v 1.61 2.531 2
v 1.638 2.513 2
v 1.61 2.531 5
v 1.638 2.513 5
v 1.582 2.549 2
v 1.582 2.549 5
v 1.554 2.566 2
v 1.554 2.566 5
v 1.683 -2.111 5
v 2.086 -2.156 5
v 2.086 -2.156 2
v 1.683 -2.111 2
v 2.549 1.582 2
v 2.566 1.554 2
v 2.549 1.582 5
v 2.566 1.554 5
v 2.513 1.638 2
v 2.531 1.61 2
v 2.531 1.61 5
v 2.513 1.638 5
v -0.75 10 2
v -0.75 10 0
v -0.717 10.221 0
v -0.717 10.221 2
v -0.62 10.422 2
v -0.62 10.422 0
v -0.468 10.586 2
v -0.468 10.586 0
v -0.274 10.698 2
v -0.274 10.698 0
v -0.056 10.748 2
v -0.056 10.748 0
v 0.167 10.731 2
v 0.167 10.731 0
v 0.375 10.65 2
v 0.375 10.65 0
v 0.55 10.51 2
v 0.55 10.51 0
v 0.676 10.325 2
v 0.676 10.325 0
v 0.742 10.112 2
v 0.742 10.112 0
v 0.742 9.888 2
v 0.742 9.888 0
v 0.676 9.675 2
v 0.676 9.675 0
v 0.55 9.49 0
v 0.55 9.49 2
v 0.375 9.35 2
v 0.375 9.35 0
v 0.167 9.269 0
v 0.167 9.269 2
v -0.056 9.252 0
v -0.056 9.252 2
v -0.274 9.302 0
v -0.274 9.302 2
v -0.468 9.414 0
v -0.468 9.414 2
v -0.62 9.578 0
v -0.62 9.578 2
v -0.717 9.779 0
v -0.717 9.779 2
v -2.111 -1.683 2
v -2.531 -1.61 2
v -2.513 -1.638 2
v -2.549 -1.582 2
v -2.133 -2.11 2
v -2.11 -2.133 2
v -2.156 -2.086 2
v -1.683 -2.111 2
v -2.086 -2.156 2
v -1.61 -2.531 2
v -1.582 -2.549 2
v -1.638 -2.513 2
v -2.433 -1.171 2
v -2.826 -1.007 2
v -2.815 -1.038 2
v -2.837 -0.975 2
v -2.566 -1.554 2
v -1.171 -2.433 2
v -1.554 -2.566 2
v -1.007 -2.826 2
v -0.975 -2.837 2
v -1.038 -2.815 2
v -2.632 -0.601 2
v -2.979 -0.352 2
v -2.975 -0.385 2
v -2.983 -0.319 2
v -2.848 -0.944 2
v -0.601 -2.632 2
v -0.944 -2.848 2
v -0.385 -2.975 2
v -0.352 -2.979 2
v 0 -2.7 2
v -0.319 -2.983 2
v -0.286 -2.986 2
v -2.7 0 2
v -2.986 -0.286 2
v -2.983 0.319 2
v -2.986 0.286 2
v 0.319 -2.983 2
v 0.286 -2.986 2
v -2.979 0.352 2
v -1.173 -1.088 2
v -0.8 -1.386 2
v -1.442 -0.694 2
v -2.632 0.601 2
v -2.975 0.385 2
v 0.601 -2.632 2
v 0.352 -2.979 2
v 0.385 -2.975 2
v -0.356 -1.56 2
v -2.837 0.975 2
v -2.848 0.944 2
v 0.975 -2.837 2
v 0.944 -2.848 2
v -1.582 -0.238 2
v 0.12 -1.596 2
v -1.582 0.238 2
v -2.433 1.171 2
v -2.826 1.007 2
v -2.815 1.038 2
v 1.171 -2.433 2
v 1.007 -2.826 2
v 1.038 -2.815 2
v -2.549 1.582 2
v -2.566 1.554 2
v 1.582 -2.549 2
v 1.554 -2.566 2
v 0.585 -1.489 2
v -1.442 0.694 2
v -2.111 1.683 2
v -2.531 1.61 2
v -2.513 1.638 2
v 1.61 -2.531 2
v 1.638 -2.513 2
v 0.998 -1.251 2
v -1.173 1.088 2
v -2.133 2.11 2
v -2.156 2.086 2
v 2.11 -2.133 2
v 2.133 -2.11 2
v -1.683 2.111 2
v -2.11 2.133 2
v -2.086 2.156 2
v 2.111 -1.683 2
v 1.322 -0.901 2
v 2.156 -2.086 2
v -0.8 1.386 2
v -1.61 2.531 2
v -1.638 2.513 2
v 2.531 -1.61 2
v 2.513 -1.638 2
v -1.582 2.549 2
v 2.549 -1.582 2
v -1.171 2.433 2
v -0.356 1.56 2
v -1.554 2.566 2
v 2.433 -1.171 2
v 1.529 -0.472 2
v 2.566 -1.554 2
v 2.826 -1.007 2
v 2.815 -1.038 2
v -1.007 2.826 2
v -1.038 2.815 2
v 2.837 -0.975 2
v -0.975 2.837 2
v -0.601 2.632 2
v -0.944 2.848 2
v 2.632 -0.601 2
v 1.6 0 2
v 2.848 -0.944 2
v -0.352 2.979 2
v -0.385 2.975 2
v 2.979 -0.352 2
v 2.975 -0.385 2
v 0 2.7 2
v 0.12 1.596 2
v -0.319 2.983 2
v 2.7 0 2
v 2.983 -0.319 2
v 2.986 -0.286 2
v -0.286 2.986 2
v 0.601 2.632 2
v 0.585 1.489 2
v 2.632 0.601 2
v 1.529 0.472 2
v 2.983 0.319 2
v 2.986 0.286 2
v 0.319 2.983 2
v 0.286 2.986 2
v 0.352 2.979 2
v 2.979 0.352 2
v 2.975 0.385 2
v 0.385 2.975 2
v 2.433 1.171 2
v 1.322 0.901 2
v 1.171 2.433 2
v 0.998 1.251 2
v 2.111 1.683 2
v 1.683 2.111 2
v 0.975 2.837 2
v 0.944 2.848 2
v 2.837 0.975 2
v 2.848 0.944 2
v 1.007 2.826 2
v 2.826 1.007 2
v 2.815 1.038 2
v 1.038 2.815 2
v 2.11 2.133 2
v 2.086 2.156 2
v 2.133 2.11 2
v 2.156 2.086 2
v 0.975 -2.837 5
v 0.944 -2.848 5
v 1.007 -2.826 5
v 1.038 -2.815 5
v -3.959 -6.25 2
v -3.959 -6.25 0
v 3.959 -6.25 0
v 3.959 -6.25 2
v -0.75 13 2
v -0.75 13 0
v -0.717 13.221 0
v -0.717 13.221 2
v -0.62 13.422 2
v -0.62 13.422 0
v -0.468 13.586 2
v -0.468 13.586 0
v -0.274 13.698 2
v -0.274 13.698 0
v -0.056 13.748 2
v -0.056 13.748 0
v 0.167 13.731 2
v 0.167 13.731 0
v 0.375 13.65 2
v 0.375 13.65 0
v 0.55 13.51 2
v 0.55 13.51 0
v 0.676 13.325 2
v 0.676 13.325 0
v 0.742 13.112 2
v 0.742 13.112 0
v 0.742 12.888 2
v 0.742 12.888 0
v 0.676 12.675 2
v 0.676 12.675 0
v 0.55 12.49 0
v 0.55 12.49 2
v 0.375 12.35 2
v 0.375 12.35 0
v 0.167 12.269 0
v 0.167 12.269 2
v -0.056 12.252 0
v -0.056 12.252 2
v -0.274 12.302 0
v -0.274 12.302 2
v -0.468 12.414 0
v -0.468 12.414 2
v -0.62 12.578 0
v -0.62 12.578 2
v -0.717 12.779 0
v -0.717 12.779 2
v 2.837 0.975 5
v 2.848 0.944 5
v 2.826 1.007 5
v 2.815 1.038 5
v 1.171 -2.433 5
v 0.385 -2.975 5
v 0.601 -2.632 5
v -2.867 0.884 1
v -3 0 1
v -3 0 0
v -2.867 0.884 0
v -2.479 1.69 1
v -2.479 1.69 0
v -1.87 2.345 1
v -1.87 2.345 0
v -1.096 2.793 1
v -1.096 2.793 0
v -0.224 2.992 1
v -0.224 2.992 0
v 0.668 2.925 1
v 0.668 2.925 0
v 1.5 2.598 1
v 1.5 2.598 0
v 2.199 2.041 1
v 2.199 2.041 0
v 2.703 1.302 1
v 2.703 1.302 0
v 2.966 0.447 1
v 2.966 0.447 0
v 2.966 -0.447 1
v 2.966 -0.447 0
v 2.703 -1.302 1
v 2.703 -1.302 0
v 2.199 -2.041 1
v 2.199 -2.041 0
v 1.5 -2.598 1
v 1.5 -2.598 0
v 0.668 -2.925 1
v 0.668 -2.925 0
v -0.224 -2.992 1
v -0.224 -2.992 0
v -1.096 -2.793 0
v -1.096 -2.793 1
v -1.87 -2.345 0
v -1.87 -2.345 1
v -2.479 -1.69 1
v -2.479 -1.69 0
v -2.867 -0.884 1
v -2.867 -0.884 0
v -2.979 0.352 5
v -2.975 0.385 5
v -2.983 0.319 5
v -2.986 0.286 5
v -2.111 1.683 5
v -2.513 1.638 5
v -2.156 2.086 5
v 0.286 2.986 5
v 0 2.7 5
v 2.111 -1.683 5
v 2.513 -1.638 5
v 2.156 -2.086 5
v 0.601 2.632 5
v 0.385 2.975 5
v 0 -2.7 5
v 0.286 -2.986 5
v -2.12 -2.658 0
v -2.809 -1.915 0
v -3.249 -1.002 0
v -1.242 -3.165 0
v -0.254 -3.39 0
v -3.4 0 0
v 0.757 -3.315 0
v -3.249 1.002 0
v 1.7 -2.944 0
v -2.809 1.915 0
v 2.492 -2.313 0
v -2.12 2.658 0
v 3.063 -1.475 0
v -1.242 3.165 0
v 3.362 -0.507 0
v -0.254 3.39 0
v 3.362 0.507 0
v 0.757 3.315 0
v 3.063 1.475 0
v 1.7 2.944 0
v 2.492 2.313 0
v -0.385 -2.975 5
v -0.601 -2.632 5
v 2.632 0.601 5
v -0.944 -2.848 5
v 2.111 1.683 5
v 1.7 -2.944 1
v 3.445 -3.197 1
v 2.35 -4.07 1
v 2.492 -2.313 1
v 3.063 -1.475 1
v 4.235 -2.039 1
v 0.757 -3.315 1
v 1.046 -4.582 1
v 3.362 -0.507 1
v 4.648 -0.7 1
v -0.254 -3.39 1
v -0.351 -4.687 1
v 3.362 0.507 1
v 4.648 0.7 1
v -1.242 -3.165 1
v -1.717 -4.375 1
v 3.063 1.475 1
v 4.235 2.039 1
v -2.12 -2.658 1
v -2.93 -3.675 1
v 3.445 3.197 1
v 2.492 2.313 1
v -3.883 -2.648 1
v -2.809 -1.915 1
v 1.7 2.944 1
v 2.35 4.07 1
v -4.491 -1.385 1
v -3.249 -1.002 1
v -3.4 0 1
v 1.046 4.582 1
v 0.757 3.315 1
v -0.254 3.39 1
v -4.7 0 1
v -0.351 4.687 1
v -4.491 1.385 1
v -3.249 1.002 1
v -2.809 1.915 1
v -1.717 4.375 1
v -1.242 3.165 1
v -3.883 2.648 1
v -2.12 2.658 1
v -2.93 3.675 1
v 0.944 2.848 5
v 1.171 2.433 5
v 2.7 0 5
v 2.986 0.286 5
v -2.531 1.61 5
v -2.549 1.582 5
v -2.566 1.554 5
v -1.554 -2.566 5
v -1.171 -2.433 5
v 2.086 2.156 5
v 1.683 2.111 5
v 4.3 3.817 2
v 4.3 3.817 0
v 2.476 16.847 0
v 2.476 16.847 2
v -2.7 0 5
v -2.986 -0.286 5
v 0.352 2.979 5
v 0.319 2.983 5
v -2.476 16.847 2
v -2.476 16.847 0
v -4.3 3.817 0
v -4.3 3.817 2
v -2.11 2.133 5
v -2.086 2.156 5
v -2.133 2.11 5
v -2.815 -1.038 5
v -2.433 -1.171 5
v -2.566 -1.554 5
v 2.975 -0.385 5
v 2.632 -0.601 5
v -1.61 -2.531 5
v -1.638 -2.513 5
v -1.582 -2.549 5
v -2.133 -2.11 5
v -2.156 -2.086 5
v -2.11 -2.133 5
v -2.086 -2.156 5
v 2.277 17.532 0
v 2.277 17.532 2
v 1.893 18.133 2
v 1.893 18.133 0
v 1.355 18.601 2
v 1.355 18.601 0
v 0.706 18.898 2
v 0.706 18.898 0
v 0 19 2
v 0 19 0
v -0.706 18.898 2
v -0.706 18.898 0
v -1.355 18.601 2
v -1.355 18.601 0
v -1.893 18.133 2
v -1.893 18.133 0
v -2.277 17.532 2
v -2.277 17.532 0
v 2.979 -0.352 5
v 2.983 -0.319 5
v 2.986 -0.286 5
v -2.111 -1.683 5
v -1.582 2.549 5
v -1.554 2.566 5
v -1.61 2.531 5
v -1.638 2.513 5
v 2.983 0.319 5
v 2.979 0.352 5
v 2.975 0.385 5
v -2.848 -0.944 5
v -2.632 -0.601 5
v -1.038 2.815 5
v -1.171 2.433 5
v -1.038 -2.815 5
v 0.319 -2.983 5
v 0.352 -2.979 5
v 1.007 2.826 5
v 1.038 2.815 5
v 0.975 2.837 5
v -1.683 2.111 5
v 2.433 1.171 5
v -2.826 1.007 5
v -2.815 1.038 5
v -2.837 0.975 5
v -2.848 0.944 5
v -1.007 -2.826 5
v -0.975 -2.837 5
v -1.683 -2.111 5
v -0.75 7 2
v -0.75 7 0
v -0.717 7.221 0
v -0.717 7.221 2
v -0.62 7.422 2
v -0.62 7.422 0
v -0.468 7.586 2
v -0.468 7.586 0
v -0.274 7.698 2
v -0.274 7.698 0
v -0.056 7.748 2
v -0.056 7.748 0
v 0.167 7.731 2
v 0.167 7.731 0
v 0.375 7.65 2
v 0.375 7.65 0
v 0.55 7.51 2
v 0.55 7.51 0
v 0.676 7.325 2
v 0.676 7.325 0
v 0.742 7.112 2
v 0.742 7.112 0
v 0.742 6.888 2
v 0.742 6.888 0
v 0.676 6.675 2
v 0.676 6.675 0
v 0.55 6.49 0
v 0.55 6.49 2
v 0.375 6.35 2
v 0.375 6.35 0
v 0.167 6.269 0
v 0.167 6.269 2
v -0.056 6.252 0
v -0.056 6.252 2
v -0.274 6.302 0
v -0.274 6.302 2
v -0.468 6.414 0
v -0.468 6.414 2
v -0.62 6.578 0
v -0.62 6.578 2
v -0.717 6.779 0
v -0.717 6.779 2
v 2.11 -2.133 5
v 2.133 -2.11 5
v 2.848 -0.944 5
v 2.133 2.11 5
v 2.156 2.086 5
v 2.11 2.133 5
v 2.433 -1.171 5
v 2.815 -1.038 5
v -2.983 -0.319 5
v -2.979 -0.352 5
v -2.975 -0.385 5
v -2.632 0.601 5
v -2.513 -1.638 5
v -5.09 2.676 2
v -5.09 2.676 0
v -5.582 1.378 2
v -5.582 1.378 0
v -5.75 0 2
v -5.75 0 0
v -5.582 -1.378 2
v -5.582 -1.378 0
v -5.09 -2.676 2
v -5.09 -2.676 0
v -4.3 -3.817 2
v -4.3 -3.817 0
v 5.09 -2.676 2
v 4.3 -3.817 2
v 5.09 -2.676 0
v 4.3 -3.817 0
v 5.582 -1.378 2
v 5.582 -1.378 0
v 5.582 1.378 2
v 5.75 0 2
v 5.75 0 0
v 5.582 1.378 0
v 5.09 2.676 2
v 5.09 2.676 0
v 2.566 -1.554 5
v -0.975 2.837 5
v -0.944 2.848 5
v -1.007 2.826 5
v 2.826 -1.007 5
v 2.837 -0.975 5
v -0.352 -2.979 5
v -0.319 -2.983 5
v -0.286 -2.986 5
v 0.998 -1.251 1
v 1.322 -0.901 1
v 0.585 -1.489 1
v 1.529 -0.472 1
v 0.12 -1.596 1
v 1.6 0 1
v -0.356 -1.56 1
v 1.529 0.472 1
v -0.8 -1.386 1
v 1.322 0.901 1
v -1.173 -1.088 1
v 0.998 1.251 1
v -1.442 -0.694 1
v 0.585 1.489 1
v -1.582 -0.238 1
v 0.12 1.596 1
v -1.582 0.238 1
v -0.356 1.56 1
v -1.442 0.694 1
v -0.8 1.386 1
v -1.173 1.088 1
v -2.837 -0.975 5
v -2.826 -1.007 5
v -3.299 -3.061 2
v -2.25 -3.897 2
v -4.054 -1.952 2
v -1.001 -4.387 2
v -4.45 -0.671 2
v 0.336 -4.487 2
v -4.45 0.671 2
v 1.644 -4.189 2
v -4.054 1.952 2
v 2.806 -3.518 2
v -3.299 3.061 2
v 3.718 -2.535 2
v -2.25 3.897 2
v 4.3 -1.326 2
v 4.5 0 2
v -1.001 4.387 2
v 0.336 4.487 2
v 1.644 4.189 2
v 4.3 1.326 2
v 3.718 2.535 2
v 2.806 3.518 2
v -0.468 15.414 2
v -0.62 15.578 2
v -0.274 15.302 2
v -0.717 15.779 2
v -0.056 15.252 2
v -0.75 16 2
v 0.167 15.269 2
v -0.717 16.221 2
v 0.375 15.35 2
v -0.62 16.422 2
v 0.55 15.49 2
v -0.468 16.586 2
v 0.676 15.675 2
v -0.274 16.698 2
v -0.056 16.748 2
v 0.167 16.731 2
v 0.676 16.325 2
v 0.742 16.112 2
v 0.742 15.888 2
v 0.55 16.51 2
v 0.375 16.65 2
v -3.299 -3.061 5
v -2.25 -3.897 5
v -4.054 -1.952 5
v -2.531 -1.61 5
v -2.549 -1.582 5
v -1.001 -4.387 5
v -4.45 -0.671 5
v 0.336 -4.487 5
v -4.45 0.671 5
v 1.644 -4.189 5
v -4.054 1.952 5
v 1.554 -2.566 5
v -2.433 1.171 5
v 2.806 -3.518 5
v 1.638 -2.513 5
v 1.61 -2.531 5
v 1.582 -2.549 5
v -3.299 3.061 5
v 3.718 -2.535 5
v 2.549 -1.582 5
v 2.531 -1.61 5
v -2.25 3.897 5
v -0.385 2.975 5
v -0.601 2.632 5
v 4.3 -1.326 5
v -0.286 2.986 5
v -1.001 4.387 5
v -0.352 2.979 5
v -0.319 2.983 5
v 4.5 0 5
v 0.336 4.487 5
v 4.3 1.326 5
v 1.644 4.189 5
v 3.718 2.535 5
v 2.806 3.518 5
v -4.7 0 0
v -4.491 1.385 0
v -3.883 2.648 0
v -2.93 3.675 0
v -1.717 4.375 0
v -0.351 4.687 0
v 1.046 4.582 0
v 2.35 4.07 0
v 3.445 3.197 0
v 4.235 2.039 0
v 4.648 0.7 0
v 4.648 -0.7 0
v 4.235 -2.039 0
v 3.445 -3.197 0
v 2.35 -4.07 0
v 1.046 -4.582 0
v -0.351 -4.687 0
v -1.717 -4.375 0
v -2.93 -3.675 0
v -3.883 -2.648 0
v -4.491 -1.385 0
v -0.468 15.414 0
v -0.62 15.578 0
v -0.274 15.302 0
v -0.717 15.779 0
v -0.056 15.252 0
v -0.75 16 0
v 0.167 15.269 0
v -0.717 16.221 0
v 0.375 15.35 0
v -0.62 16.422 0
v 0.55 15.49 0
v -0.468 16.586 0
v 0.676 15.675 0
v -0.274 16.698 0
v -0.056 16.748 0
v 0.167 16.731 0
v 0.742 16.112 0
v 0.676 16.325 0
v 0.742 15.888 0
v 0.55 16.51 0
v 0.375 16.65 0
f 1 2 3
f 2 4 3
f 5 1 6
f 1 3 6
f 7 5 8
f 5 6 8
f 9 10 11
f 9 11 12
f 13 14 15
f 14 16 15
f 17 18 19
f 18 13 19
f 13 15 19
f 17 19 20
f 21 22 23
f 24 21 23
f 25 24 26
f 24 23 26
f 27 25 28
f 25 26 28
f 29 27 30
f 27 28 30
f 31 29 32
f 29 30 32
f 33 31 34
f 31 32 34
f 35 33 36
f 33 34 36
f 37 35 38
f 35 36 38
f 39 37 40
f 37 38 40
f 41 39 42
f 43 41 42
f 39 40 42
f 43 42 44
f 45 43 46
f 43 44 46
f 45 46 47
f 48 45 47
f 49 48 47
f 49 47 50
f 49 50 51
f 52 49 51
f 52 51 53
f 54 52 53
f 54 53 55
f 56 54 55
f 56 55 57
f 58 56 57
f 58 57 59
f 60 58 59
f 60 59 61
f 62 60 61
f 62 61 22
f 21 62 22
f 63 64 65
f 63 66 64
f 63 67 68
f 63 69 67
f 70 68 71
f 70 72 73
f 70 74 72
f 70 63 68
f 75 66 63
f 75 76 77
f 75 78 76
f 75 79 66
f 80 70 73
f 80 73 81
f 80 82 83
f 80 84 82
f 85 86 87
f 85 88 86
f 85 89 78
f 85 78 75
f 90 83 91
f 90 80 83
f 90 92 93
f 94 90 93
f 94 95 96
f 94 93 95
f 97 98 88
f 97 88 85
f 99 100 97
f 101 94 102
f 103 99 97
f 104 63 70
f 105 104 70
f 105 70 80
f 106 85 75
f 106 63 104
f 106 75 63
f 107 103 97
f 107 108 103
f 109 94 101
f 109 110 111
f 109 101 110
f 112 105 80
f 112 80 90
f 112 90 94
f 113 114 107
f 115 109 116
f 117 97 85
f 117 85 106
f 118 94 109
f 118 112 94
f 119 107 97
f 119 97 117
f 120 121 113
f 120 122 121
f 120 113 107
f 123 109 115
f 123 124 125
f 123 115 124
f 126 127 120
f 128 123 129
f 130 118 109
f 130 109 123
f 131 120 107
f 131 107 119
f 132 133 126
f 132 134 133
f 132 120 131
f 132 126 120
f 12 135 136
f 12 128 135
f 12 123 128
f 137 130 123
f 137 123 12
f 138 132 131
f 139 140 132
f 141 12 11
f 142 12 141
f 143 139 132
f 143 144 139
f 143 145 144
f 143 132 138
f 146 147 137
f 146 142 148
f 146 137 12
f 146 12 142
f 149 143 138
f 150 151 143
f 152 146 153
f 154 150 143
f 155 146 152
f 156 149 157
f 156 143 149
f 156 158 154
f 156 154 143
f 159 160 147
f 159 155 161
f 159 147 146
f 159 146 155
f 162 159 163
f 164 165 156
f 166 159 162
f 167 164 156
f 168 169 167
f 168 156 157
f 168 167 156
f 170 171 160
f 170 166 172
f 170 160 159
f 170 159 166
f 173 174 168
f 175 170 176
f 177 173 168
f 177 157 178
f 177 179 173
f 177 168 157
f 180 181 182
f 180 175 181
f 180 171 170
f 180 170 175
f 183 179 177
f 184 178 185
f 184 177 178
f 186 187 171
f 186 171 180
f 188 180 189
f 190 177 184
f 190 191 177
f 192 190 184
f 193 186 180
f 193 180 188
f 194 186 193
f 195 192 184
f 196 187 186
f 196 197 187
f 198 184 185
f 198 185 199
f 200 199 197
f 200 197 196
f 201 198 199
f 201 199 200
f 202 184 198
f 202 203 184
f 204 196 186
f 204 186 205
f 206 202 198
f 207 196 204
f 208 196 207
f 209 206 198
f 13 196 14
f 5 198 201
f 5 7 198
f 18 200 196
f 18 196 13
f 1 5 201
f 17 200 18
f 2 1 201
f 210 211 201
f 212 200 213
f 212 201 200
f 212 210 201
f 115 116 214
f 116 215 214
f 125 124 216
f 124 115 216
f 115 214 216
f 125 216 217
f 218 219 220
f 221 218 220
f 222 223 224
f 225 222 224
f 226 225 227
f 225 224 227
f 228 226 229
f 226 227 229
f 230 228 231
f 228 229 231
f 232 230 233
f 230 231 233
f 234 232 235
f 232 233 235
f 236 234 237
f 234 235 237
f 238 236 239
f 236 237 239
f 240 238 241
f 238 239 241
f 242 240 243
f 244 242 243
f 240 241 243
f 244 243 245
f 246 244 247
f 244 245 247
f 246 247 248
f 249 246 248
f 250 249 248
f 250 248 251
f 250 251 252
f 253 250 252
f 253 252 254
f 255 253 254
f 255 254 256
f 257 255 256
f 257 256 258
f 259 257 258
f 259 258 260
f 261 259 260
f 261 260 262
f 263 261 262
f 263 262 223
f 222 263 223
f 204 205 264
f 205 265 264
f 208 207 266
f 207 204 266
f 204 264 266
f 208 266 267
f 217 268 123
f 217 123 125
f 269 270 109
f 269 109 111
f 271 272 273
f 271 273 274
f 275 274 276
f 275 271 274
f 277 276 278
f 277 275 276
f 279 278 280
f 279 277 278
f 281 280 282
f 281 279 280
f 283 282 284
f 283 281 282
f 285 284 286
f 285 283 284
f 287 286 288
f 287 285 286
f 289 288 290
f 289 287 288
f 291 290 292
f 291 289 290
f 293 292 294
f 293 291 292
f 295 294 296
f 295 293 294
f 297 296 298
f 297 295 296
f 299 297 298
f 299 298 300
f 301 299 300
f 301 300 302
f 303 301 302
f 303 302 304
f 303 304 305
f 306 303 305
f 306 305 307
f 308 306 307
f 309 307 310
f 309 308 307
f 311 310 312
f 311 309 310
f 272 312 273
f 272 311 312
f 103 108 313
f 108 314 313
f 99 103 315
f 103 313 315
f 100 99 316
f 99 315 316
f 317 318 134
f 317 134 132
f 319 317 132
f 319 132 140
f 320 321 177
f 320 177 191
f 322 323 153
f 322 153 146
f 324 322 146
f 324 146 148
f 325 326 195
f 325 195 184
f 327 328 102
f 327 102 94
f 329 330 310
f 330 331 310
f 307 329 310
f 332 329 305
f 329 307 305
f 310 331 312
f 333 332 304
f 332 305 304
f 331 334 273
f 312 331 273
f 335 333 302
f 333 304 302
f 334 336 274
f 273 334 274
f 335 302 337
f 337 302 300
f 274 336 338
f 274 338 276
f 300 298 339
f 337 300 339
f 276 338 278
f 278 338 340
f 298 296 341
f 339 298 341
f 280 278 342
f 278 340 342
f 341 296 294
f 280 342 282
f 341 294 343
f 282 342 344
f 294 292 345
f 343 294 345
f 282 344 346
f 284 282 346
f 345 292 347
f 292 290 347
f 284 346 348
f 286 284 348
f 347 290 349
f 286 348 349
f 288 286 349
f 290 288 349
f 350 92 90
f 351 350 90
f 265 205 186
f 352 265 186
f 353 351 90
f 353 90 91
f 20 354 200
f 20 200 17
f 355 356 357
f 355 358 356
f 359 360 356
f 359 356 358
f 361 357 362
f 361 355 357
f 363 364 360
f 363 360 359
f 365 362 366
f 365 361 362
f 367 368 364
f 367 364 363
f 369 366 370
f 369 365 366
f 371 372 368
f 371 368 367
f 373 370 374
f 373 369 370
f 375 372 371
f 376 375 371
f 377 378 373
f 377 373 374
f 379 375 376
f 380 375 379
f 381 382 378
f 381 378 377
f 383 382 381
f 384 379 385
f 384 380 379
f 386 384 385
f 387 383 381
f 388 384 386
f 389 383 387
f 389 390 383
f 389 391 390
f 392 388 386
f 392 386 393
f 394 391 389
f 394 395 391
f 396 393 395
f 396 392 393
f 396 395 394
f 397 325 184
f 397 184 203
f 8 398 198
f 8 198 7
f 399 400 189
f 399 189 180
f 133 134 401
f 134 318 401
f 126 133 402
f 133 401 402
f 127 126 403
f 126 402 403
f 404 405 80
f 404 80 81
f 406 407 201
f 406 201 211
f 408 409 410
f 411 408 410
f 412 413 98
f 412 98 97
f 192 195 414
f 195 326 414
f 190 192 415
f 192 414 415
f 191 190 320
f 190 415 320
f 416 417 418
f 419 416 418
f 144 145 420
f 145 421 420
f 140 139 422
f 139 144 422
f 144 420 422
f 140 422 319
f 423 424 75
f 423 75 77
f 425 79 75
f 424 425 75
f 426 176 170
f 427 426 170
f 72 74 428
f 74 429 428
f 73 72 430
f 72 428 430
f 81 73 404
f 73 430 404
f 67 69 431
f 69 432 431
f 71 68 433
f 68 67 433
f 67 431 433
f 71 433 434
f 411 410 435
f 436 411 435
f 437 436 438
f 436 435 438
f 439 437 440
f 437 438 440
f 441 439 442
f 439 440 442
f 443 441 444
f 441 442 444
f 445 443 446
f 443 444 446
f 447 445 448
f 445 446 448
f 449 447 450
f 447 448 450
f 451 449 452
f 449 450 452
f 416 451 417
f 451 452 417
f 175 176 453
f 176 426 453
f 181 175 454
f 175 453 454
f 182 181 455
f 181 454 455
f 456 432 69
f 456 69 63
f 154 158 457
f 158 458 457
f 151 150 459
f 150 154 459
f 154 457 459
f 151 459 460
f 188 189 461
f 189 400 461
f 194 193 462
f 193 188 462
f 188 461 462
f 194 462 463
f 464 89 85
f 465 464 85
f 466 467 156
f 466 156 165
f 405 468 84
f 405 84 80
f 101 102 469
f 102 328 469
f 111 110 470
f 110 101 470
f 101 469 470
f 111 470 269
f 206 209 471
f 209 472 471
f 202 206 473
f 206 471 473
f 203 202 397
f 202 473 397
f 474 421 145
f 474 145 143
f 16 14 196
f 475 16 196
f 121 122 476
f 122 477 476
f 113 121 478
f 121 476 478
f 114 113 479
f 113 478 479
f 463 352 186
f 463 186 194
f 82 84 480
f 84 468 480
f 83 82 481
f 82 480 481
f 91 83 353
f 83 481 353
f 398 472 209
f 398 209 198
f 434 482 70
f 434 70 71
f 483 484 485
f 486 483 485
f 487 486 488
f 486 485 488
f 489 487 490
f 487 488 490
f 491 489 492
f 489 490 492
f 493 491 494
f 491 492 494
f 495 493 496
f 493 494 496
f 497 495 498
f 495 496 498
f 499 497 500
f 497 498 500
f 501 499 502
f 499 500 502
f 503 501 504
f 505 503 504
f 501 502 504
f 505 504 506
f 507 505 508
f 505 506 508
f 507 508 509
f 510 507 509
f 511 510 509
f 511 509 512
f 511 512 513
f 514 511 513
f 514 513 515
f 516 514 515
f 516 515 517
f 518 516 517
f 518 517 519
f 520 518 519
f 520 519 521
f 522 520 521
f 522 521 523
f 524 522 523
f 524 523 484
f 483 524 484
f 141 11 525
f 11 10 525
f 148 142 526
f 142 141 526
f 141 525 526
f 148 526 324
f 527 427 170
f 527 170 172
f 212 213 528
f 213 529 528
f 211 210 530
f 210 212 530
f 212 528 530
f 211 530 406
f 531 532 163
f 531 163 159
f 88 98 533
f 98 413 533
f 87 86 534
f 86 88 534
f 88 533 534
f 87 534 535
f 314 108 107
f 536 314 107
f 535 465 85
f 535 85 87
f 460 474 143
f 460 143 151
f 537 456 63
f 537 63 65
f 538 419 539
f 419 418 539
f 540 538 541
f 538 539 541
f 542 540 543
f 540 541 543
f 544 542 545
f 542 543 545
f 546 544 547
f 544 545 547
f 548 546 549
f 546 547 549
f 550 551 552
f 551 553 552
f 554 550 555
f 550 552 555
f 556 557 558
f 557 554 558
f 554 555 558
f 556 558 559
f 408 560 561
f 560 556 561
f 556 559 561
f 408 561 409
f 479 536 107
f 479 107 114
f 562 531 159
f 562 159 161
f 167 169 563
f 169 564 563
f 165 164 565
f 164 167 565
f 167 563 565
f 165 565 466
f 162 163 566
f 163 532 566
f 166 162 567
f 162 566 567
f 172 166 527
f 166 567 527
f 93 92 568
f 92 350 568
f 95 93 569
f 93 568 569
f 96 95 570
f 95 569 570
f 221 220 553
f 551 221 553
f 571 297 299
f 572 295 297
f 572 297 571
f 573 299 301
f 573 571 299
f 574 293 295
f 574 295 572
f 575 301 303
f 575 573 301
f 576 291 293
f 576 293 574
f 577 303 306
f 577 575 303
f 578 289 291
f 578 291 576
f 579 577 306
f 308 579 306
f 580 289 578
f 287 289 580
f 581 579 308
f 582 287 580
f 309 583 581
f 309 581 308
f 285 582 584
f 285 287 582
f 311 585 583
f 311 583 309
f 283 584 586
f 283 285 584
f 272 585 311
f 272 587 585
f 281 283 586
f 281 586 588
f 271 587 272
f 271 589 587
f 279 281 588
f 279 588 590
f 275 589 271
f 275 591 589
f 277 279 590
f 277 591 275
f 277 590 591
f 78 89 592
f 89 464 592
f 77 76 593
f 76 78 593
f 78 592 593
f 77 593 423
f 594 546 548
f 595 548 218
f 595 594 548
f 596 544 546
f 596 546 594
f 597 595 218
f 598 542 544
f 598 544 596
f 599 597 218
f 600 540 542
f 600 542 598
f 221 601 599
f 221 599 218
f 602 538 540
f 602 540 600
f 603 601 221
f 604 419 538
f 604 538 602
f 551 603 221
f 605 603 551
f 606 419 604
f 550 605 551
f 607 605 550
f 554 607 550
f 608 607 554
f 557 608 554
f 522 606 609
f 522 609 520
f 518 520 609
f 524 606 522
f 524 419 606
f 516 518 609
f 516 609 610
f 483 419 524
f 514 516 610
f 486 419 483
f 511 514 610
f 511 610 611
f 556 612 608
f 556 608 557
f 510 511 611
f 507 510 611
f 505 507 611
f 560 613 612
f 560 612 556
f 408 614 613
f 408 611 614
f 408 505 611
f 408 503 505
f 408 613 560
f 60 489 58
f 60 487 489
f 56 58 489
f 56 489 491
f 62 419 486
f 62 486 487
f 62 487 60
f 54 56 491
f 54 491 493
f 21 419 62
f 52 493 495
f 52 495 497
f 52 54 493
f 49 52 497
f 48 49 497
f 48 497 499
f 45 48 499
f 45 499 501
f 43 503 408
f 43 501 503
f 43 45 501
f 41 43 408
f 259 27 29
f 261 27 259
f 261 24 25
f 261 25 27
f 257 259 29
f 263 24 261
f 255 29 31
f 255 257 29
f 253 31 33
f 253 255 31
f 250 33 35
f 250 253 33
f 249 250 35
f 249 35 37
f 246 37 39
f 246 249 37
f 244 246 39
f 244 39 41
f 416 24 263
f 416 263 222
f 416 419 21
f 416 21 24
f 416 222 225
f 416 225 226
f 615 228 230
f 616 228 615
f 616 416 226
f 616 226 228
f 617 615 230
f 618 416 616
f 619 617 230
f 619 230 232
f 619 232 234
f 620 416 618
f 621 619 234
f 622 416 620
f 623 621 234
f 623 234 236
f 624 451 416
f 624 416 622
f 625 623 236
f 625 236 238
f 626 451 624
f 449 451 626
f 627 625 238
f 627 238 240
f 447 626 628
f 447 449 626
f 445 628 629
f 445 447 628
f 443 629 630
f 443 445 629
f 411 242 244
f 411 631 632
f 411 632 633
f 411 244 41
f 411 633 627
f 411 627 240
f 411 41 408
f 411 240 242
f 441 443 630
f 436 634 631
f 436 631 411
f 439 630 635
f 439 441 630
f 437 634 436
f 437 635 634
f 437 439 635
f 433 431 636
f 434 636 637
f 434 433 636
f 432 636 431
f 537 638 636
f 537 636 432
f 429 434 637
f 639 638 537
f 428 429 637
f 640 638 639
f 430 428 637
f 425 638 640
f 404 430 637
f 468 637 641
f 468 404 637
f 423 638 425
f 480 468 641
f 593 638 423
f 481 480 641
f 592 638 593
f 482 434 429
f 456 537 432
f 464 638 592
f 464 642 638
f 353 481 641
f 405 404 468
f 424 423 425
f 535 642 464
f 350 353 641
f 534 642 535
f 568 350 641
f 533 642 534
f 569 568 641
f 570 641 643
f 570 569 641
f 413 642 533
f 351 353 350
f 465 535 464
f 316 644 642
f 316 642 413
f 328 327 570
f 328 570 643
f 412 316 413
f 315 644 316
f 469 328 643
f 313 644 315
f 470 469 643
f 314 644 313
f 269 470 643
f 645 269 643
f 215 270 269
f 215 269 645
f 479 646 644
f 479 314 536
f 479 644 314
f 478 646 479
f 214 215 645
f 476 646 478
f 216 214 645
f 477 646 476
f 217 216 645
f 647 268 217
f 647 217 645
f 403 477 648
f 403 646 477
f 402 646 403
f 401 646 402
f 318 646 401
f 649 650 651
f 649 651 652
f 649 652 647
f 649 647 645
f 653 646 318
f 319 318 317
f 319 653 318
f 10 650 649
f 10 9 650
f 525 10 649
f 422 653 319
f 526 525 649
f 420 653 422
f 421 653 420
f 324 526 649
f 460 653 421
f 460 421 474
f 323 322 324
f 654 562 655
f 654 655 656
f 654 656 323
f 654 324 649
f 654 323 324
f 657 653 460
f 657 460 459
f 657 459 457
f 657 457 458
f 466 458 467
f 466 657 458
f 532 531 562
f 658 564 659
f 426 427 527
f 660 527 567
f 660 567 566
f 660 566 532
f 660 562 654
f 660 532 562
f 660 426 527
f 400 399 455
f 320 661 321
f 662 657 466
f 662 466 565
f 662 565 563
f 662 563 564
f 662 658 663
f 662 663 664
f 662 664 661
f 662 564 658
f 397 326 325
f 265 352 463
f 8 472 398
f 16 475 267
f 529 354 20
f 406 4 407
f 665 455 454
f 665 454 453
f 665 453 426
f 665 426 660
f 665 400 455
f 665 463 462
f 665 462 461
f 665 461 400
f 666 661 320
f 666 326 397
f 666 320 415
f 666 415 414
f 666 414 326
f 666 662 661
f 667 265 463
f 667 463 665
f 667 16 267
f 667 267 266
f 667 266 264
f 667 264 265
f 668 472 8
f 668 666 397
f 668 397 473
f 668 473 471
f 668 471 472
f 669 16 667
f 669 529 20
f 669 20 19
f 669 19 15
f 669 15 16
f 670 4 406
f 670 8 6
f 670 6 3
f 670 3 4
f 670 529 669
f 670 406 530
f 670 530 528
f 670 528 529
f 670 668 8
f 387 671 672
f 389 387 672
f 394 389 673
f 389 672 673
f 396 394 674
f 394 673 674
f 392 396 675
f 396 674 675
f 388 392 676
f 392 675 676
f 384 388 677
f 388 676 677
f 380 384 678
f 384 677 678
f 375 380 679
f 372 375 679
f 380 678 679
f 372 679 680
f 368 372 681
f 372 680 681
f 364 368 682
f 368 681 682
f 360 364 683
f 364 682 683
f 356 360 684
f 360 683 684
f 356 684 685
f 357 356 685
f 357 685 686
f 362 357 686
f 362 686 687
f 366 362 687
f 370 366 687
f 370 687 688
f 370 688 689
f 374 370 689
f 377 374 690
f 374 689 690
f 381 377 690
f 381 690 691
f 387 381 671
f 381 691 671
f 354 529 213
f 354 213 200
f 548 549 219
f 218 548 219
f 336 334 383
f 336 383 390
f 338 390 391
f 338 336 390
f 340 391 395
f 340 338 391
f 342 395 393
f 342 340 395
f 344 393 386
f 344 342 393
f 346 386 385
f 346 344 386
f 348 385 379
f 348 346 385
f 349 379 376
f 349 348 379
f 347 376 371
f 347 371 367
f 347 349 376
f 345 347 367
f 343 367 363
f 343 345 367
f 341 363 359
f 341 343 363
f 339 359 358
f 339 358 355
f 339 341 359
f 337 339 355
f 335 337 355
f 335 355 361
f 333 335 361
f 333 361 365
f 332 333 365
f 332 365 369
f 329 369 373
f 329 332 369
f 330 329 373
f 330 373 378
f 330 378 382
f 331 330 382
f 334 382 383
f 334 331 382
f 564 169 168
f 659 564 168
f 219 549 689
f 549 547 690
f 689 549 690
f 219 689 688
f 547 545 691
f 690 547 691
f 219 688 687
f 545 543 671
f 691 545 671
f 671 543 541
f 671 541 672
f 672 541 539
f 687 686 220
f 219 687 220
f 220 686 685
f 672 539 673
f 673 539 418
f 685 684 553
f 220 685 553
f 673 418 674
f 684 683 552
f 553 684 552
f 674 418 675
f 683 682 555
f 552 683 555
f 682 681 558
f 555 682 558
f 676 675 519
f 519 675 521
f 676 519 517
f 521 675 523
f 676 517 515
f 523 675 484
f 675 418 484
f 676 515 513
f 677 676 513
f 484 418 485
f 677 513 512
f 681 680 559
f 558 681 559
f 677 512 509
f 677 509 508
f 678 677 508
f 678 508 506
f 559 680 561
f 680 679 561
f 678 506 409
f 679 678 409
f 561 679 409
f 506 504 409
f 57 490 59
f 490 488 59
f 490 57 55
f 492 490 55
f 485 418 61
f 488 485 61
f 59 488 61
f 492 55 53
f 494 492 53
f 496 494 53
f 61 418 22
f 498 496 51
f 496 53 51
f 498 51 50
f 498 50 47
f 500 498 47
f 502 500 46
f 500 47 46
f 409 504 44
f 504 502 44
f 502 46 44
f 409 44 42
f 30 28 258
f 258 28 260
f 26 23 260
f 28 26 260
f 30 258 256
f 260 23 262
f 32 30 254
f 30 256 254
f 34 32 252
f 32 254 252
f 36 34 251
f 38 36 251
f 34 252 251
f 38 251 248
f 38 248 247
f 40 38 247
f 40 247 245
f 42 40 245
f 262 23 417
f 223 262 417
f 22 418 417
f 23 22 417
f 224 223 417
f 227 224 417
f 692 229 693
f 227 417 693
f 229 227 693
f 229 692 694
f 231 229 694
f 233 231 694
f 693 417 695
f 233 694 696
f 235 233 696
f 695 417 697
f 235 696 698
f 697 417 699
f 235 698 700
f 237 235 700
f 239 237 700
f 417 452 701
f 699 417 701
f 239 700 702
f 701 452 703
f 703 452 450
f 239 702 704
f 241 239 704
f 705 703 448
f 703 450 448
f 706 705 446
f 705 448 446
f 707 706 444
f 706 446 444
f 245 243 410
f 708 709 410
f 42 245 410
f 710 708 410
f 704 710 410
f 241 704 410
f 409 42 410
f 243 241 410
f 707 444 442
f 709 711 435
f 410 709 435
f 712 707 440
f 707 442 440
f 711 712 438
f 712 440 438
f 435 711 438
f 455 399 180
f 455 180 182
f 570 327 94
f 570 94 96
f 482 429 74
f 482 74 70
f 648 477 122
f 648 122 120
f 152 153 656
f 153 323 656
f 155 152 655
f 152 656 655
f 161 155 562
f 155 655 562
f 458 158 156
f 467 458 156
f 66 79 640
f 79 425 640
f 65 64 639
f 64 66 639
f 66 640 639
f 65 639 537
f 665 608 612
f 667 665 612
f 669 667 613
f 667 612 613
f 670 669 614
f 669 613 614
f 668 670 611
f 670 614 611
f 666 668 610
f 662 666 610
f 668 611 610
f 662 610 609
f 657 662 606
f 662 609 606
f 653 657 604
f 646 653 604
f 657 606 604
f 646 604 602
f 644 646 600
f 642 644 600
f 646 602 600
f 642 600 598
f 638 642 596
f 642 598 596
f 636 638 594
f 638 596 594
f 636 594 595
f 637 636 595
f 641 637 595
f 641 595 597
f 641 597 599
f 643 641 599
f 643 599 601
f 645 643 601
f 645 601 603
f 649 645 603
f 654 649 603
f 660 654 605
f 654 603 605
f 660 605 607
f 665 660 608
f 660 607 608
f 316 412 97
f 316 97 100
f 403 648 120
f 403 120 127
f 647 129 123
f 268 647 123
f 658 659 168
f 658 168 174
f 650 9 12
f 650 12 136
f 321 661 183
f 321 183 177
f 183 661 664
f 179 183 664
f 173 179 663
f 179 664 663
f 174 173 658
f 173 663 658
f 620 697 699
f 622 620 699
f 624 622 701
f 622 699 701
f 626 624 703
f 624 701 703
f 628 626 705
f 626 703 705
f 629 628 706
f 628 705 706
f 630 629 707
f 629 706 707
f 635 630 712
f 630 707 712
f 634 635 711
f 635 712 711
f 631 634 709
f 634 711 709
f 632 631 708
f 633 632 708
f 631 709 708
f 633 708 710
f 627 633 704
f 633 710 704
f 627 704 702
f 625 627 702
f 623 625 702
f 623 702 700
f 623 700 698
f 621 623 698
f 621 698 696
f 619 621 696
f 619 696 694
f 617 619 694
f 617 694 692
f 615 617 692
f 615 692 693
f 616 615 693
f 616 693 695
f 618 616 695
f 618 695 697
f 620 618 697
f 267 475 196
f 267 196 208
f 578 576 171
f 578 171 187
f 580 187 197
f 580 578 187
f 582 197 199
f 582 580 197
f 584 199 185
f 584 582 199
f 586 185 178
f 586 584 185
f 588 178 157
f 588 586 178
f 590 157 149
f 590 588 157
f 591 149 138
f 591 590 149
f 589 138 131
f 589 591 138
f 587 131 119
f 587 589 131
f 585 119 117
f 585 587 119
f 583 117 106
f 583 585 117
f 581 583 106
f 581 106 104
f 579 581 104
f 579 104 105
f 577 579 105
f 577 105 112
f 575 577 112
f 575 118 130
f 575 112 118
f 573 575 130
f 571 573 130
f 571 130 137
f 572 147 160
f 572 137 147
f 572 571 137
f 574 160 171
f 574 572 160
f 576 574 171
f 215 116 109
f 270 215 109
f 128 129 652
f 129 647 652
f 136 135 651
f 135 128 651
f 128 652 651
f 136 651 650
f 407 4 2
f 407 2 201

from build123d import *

# Parameters (mm, degrees)
ESQUISSE1_R                  = 5.75
ESQUISSE1_R_2                = 1.6
BOSS_EXTRU_1_DEPTH           = 5
ESQUISSE2_R                  = 3
ENL_V_MAT_EXTRU_1_DEPTH      = 3
ENL_V_START                  = -3
ESQUISSE3_R                  = 5.75
ESQUISSE3_R_2                = 4.5
ENL_V_MAT_EXTRU_2_DEPTH      = 3
BOSS_EXTRU_2_DEPTH           = 2
R_P_TITION_CIRCULAIRE1_COUNT = 2
ESQUISSE5_R                  = 0.75
ENL_V_MAT_EXTRU_3_DEPTH      = 3
R_P_TITION_CIRCULAIRE2_COUNT = 2
BOSS_EXTRU_3_DEPTH           = 3
R_P_TITION_CIRCULAIRE3_COUNT = 28
ENL_V_START_2                = -1
ESQUISSE7_R                  = 3
ESQUISSE7_R_2                = 1.6
ENL_V_MAT_EXTRU_4_DEPTH      = 1
ESQUISSE8_R                  = 4.7
ESQUISSE8_R_2                = 3.4
ENL_V_MAT_EXTRU_5_DEPTH      = 1
WYTNIJ_WYCI_GNI_CIE1_DEPTH   = 10


with BuildPart() as part:
    # Esquisse1 → Boss.-Extru.1 (new body)
    with BuildSketch(Plane.XY):
        Circle(ESQUISSE1_R)
        Circle(ESQUISSE1_R_2, mode=Mode.SUBTRACT)
    extrude(amount=BOSS_EXTRU_1_DEPTH)

    # Esquisse2 → Enlèv. mat.-Extru.1 (cut)
    with BuildSketch(Plane.XY.offset(5)):
        Circle(ESQUISSE2_R)
    extrude(amount=-ENL_V_MAT_EXTRU_1_DEPTH, mode=Mode.SUBTRACT)

    # Esquisse3 → Enlèv. mat.-Extru.2 (cut)
    with BuildSketch(Plane.XY.offset(5).offset(ENL_V_START)):
        Circle(ESQUISSE3_R)
        Circle(ESQUISSE3_R_2, mode=Mode.SUBTRACT)
    extrude(amount=ENL_V_MAT_EXTRU_2_DEPTH, mode=Mode.SUBTRACT)

    # Esquisse4 → Boss.-Extru.2 (add)
    with BuildSketch(Plane(origin=(0, 0, 0), x_dir=(-1, 0, 0), z_dir=(0, 0, -1))):
        with BuildLine():
            Line((-4.3, 3.817394399), (-2.475852955, 16.846629695))
            ThreePointArc((-2.475852955, 16.846629695), (0, 19), (2.475852955, 16.846629695))
            Line((2.475852955, 16.846629695), (4.3, 3.817394399))
            ThreePointArc((4.3, 3.817394399), (0, 5.75), (-4.3, 3.817394399))
        make_face()
    boss_extru_2 = extrude(amount=-BOSS_EXTRU_2_DEPTH)

    # Répétition circulaire1: Boss.-Extru.2 ×2 about axis
    r_p_tition_circulaire1_axis = Axis((0, 0, 0), (0, 0, 1))
    for i in range(1, R_P_TITION_CIRCULAIRE1_COUNT):
        add(boss_extru_2.rotate(r_p_tition_circulaire1_axis, i * 360 / R_P_TITION_CIRCULAIRE1_COUNT))

    # Esquisse5 → Enlèv. mat.-Extru.3 (cut)
    with BuildSketch(Plane(origin=(0, 0, 0), x_dir=(-1, 0, 0), z_dir=(0, 0, -1))):
        with Locations((0, 7)):
            Circle(ESQUISSE5_R)
        with Locations((0, 10)):
            Circle(ESQUISSE5_R)
        with Locations((0, 13)):
            Circle(ESQUISSE5_R)
        with Locations((0, 16)):
            Circle(ESQUISSE5_R)
    enl_v_mat_extru_3 = extrude(amount=-ENL_V_MAT_EXTRU_3_DEPTH, mode=Mode.SUBTRACT)

    # Répétition circulaire2: Enlèv. mat.-Extru.3 ×2 about axis
    r_p_tition_circulaire2_axis = Axis((0, 0, 0), (0, 0, 1))
    for i in range(1, R_P_TITION_CIRCULAIRE2_COUNT):
        add(enl_v_mat_extru_3.rotate(r_p_tition_circulaire2_axis, i * 360 / R_P_TITION_CIRCULAIRE2_COUNT), mode=Mode.SUBTRACT)

    # Esquisse6 → Boss.-Extru.3 (add)
    with BuildSketch(Plane.XY.offset(5)):
        Polygon((-0.3, 3), (0, 2.7), (0.3, 3), align=None)
    boss_extru_3 = extrude(amount=-BOSS_EXTRU_3_DEPTH)

    # Répétition circulaire3: Boss.-Extru.3 ×28 about axis
    r_p_tition_circulaire3_axis = Axis((0, 0, 0), (0, 0, 1))
    for i in range(1, R_P_TITION_CIRCULAIRE3_COUNT):
        add(boss_extru_3.rotate(r_p_tition_circulaire3_axis, i * 360 / R_P_TITION_CIRCULAIRE3_COUNT))

    # Esquisse7 → Enlèv. mat.-Extru.4 (cut)
    with BuildSketch(Plane(origin=(0, 0, 0), x_dir=(-1, 0, 0), z_dir=(0, 0, -1)).offset(ENL_V_START_2)):
        Circle(ESQUISSE7_R)
        Circle(ESQUISSE7_R_2, mode=Mode.SUBTRACT)
    extrude(amount=ENL_V_MAT_EXTRU_4_DEPTH, mode=Mode.SUBTRACT)

    # Esquisse8 → Enlèv. mat.-Extru.5 (cut)
    with BuildSketch(Plane(origin=(0, 0, 0), x_dir=(-1, 0, 0), z_dir=(0, 0, -1))):
        Circle(ESQUISSE8_R)
        Circle(ESQUISSE8_R_2, mode=Mode.SUBTRACT)
    extrude(amount=-ENL_V_MAT_EXTRU_5_DEPTH, mode=Mode.SUBTRACT)

    # Szkic1 → Wytnij-wyciągnięcie1 (cut)
    with BuildSketch(Plane(origin=(0, 0, 0), x_dir=(-1, 0, 0), z_dir=(0, 0, -1))):
        with BuildLine():
            Line((3.959425115, -6.25), (-3.959425115, -6.25))
            Line((-3.959425115, -6.25), (-2.475852955, -16.846629695))
            ThreePointArc((-2.475852955, -16.846629695), (0, -19), (2.475852955, -16.846629695))
            Line((2.475852955, -16.846629695), (3.959425115, -6.25))
        make_face()
    extrude(amount=-WYTNIJ_WYCI_GNI_CIE1_DEPTH, mode=Mode.SUBTRACT)


solid = part.part
